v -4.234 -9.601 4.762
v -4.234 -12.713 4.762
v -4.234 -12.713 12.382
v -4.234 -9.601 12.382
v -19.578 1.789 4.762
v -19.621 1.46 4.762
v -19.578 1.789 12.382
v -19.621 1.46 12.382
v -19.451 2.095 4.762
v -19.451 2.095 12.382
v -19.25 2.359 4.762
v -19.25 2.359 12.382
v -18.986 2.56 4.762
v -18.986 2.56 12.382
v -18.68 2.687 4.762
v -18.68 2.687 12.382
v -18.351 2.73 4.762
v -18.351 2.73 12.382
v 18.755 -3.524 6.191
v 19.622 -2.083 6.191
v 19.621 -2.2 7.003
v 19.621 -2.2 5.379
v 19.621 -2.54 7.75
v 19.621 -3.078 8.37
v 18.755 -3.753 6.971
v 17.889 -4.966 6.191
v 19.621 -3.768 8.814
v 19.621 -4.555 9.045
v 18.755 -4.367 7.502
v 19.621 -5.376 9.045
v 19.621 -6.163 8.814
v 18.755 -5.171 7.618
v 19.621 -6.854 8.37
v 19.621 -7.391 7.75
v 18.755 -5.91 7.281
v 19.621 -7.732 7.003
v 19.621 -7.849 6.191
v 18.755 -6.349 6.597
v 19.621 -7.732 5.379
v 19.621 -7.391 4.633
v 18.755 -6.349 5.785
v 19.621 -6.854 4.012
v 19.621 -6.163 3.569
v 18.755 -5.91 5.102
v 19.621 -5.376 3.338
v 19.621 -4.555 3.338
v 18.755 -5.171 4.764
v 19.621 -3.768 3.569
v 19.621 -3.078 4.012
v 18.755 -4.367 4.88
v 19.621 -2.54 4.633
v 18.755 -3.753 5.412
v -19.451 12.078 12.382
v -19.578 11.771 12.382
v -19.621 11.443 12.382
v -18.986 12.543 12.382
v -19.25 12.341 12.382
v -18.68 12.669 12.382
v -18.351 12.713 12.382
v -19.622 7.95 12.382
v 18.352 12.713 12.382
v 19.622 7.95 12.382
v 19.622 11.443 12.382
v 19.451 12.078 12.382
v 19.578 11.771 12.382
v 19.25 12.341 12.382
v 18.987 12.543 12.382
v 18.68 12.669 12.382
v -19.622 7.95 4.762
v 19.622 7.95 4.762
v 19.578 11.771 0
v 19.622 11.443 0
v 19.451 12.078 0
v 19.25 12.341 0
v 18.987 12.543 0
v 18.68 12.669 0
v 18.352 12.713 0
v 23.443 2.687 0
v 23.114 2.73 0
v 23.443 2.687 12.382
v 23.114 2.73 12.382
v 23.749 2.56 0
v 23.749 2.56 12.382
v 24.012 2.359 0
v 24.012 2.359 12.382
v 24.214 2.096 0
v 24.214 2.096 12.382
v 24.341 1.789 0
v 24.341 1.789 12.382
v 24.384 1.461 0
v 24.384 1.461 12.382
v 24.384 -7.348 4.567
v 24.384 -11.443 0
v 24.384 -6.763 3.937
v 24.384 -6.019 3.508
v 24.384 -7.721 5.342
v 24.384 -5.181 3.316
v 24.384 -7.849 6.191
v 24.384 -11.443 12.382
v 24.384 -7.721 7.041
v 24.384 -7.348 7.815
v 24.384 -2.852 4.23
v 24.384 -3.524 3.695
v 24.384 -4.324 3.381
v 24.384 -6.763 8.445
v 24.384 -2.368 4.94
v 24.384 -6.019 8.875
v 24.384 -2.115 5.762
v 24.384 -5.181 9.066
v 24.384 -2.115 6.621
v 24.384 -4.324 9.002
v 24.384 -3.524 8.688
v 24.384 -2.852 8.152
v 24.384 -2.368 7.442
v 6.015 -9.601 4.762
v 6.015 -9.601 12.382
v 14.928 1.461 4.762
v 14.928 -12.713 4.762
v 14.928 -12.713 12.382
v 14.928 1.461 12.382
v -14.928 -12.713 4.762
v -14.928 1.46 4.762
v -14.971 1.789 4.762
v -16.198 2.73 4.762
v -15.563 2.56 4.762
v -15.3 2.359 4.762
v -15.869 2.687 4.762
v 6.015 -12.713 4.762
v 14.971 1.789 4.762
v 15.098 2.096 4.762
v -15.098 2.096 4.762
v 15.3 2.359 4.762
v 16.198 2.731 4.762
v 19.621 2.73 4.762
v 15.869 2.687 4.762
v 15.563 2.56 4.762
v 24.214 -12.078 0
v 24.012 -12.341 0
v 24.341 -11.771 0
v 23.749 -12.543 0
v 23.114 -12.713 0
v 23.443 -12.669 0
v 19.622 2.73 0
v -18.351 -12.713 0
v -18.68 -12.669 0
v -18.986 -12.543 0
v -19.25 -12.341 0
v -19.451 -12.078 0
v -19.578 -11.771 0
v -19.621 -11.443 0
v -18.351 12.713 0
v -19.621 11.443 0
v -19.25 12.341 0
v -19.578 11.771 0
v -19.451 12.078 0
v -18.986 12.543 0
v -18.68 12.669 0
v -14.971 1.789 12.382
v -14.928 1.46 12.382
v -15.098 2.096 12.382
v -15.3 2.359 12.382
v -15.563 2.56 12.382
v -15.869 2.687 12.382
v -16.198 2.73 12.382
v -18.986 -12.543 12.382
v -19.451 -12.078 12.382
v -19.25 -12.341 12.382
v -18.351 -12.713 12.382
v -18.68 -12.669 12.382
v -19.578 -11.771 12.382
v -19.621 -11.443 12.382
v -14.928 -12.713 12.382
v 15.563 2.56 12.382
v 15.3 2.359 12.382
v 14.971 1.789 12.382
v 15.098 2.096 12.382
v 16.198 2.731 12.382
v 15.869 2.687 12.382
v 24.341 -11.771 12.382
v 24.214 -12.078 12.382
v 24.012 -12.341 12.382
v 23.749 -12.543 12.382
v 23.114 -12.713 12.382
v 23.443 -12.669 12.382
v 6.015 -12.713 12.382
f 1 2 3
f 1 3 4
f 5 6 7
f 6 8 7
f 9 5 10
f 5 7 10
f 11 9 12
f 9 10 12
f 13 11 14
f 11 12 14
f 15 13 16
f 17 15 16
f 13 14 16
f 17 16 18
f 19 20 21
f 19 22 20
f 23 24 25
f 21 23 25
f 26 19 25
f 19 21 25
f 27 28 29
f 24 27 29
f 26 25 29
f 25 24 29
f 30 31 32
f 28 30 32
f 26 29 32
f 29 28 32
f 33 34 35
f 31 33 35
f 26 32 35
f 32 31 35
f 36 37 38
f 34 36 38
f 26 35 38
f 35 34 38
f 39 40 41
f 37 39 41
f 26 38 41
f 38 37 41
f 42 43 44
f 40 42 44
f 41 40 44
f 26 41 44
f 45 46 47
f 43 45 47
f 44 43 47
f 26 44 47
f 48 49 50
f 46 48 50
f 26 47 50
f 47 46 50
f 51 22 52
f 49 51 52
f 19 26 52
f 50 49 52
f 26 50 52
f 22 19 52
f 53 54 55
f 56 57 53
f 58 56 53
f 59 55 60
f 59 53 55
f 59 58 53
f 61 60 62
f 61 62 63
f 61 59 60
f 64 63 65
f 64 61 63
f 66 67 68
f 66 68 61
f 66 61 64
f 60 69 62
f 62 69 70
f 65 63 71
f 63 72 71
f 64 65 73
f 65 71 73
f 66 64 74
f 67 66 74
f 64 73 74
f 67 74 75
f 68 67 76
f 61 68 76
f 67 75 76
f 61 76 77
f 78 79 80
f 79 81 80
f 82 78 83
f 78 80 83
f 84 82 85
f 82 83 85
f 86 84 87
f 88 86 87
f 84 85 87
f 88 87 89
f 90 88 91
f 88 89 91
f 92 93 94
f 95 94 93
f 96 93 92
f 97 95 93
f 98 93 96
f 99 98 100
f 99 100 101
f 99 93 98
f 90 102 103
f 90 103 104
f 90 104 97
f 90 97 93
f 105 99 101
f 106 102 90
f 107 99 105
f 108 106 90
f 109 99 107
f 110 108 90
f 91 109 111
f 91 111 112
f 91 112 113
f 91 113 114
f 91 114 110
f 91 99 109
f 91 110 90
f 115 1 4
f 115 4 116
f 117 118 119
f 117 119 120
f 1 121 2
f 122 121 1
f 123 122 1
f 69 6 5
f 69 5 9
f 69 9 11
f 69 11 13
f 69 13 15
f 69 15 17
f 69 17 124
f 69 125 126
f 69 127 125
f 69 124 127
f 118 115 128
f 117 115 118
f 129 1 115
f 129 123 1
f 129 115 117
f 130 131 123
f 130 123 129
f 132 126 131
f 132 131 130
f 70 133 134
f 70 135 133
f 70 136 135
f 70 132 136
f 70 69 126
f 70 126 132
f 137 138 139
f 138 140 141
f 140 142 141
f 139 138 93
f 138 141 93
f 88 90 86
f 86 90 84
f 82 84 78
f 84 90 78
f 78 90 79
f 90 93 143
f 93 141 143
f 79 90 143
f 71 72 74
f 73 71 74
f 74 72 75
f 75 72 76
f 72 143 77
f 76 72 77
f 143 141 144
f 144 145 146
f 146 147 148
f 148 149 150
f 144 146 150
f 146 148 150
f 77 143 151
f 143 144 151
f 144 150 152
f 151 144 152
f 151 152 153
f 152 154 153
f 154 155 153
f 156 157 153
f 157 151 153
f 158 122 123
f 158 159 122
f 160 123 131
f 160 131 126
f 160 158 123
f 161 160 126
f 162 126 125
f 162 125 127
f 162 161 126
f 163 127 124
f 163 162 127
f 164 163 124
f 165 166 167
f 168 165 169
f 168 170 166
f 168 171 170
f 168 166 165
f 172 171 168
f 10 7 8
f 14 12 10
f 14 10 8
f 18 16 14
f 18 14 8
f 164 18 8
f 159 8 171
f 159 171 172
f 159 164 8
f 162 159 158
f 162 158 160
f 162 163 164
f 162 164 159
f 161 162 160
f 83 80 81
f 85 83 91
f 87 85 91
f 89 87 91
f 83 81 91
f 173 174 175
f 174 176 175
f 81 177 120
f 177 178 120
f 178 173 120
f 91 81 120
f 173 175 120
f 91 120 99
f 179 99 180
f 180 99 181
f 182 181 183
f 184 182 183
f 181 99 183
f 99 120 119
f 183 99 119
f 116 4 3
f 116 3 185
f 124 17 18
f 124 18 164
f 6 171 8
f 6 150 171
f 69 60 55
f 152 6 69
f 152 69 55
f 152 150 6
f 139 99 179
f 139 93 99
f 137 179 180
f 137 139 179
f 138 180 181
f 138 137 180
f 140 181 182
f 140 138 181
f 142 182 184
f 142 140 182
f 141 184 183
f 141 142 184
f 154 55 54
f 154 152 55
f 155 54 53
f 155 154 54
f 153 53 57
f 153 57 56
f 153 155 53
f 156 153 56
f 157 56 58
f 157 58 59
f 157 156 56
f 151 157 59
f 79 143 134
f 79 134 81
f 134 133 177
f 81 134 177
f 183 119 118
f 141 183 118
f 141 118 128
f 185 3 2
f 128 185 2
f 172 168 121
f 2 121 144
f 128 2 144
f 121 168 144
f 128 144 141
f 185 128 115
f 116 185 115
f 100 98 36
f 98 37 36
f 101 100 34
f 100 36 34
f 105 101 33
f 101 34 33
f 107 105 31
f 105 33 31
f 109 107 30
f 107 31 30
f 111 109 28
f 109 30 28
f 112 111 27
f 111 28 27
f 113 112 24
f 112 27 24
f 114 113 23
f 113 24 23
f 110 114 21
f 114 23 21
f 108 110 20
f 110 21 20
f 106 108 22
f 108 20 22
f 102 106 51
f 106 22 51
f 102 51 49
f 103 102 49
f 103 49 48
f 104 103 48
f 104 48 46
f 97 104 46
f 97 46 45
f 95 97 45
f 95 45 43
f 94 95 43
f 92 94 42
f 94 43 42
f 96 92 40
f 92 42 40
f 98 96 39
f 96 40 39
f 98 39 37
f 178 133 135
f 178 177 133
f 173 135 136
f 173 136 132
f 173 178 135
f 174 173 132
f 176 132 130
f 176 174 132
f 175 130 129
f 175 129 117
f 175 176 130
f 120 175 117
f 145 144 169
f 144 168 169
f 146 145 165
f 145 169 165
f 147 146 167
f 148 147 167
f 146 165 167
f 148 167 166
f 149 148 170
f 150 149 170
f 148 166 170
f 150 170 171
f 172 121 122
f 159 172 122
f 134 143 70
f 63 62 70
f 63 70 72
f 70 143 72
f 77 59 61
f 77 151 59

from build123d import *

# Parameters (mm, degrees)
F0_W     = 39.243
F0_H     = 25.4254
F1_DEPTH = 4.7625
F2_W     = 4.69392
F2_H     = 15.4432
F2_W_2   = 10.2489
F2_H_2   = 3.1115
F2_W_3   = 39.243
F2_H_3   = 4.7625
F3_DEPTH = 7.62
F5_DEPTH = 4.7625
F7_D     = 5.7658
F7_DEPTH = 4.7625
F7_TIP   = 1.7322210786
F8_R     = 1.27


# Not quite as in the source:
# - a length typed as a fraction of an inch, garbled in the dataset ("3 / 203.2 mm" for 3/8 in), is restored


with BuildPart() as f1:
    # F0 (on Top) → F1 (new body)
    with BuildSketch(Plane.XY):
        Rectangle(F0_W, F0_H)
    extrude(amount=F1_DEPTH)

    # F2 (on face) → F3 (join)
    with BuildSketch(Plane.XY.offset(4.7625)):
        with Locations((-17.27454, -4.9911)):
            Rectangle(F2_W, F2_H)
        with Locations((17.27454, -4.9911)):
            Rectangle(F2_W, F2_H)
        with Locations((0.89027, -11.15695)):
            Rectangle(F2_W_2, F2_H_2)
        with Locations((0, 10.33145)):
            Rectangle(F2_W_3, F2_H_3)
    extrude(amount=F3_DEPTH)

    # F4 (on face) → F5 (join)
    with BuildSketch(Plane.YZ.offset(19.6215)):
        Polygon((2.7305, 4.7625), (2.7305, 12.3825), (-12.7127, 12.3825), (-12.7127, 0), (2.7305, 0), align=None)
    extrude(amount=F5_DEPTH)

    # F7
    with Locations(Plane.YZ.offset(24.384)):
        with Locations((-4.9657, 6.19125)):
            Hole(F7_D / 2, depth=F7_DEPTH)
            with Locations((0, 0, -(F7_DEPTH + F7_TIP / 2))):  # 118° drill point
                Cone(0, F7_D / 2, F7_TIP, mode=Mode.SUBTRACT)

    # F8
    f8_edges = [f1.edges().sort_by_distance(p)[0] for p in [
        (-14.92758, 2.7305, 8.5725),
        (14.92758, 2.7305, 8.5725),
        (-19.6215, -12.7127, 6.19125),
        (24.384, -12.7127, 6.19125),
        (24.384, 2.7305, 6.19125),
        (19.6215, 12.7127, 6.19125),
        (-19.6215, 12.7127, 6.19125),
        (-19.6215, 2.7305, 8.5725),
    ]]
    fillet(f8_edges, radius=F8_R)


solid = f1.part
